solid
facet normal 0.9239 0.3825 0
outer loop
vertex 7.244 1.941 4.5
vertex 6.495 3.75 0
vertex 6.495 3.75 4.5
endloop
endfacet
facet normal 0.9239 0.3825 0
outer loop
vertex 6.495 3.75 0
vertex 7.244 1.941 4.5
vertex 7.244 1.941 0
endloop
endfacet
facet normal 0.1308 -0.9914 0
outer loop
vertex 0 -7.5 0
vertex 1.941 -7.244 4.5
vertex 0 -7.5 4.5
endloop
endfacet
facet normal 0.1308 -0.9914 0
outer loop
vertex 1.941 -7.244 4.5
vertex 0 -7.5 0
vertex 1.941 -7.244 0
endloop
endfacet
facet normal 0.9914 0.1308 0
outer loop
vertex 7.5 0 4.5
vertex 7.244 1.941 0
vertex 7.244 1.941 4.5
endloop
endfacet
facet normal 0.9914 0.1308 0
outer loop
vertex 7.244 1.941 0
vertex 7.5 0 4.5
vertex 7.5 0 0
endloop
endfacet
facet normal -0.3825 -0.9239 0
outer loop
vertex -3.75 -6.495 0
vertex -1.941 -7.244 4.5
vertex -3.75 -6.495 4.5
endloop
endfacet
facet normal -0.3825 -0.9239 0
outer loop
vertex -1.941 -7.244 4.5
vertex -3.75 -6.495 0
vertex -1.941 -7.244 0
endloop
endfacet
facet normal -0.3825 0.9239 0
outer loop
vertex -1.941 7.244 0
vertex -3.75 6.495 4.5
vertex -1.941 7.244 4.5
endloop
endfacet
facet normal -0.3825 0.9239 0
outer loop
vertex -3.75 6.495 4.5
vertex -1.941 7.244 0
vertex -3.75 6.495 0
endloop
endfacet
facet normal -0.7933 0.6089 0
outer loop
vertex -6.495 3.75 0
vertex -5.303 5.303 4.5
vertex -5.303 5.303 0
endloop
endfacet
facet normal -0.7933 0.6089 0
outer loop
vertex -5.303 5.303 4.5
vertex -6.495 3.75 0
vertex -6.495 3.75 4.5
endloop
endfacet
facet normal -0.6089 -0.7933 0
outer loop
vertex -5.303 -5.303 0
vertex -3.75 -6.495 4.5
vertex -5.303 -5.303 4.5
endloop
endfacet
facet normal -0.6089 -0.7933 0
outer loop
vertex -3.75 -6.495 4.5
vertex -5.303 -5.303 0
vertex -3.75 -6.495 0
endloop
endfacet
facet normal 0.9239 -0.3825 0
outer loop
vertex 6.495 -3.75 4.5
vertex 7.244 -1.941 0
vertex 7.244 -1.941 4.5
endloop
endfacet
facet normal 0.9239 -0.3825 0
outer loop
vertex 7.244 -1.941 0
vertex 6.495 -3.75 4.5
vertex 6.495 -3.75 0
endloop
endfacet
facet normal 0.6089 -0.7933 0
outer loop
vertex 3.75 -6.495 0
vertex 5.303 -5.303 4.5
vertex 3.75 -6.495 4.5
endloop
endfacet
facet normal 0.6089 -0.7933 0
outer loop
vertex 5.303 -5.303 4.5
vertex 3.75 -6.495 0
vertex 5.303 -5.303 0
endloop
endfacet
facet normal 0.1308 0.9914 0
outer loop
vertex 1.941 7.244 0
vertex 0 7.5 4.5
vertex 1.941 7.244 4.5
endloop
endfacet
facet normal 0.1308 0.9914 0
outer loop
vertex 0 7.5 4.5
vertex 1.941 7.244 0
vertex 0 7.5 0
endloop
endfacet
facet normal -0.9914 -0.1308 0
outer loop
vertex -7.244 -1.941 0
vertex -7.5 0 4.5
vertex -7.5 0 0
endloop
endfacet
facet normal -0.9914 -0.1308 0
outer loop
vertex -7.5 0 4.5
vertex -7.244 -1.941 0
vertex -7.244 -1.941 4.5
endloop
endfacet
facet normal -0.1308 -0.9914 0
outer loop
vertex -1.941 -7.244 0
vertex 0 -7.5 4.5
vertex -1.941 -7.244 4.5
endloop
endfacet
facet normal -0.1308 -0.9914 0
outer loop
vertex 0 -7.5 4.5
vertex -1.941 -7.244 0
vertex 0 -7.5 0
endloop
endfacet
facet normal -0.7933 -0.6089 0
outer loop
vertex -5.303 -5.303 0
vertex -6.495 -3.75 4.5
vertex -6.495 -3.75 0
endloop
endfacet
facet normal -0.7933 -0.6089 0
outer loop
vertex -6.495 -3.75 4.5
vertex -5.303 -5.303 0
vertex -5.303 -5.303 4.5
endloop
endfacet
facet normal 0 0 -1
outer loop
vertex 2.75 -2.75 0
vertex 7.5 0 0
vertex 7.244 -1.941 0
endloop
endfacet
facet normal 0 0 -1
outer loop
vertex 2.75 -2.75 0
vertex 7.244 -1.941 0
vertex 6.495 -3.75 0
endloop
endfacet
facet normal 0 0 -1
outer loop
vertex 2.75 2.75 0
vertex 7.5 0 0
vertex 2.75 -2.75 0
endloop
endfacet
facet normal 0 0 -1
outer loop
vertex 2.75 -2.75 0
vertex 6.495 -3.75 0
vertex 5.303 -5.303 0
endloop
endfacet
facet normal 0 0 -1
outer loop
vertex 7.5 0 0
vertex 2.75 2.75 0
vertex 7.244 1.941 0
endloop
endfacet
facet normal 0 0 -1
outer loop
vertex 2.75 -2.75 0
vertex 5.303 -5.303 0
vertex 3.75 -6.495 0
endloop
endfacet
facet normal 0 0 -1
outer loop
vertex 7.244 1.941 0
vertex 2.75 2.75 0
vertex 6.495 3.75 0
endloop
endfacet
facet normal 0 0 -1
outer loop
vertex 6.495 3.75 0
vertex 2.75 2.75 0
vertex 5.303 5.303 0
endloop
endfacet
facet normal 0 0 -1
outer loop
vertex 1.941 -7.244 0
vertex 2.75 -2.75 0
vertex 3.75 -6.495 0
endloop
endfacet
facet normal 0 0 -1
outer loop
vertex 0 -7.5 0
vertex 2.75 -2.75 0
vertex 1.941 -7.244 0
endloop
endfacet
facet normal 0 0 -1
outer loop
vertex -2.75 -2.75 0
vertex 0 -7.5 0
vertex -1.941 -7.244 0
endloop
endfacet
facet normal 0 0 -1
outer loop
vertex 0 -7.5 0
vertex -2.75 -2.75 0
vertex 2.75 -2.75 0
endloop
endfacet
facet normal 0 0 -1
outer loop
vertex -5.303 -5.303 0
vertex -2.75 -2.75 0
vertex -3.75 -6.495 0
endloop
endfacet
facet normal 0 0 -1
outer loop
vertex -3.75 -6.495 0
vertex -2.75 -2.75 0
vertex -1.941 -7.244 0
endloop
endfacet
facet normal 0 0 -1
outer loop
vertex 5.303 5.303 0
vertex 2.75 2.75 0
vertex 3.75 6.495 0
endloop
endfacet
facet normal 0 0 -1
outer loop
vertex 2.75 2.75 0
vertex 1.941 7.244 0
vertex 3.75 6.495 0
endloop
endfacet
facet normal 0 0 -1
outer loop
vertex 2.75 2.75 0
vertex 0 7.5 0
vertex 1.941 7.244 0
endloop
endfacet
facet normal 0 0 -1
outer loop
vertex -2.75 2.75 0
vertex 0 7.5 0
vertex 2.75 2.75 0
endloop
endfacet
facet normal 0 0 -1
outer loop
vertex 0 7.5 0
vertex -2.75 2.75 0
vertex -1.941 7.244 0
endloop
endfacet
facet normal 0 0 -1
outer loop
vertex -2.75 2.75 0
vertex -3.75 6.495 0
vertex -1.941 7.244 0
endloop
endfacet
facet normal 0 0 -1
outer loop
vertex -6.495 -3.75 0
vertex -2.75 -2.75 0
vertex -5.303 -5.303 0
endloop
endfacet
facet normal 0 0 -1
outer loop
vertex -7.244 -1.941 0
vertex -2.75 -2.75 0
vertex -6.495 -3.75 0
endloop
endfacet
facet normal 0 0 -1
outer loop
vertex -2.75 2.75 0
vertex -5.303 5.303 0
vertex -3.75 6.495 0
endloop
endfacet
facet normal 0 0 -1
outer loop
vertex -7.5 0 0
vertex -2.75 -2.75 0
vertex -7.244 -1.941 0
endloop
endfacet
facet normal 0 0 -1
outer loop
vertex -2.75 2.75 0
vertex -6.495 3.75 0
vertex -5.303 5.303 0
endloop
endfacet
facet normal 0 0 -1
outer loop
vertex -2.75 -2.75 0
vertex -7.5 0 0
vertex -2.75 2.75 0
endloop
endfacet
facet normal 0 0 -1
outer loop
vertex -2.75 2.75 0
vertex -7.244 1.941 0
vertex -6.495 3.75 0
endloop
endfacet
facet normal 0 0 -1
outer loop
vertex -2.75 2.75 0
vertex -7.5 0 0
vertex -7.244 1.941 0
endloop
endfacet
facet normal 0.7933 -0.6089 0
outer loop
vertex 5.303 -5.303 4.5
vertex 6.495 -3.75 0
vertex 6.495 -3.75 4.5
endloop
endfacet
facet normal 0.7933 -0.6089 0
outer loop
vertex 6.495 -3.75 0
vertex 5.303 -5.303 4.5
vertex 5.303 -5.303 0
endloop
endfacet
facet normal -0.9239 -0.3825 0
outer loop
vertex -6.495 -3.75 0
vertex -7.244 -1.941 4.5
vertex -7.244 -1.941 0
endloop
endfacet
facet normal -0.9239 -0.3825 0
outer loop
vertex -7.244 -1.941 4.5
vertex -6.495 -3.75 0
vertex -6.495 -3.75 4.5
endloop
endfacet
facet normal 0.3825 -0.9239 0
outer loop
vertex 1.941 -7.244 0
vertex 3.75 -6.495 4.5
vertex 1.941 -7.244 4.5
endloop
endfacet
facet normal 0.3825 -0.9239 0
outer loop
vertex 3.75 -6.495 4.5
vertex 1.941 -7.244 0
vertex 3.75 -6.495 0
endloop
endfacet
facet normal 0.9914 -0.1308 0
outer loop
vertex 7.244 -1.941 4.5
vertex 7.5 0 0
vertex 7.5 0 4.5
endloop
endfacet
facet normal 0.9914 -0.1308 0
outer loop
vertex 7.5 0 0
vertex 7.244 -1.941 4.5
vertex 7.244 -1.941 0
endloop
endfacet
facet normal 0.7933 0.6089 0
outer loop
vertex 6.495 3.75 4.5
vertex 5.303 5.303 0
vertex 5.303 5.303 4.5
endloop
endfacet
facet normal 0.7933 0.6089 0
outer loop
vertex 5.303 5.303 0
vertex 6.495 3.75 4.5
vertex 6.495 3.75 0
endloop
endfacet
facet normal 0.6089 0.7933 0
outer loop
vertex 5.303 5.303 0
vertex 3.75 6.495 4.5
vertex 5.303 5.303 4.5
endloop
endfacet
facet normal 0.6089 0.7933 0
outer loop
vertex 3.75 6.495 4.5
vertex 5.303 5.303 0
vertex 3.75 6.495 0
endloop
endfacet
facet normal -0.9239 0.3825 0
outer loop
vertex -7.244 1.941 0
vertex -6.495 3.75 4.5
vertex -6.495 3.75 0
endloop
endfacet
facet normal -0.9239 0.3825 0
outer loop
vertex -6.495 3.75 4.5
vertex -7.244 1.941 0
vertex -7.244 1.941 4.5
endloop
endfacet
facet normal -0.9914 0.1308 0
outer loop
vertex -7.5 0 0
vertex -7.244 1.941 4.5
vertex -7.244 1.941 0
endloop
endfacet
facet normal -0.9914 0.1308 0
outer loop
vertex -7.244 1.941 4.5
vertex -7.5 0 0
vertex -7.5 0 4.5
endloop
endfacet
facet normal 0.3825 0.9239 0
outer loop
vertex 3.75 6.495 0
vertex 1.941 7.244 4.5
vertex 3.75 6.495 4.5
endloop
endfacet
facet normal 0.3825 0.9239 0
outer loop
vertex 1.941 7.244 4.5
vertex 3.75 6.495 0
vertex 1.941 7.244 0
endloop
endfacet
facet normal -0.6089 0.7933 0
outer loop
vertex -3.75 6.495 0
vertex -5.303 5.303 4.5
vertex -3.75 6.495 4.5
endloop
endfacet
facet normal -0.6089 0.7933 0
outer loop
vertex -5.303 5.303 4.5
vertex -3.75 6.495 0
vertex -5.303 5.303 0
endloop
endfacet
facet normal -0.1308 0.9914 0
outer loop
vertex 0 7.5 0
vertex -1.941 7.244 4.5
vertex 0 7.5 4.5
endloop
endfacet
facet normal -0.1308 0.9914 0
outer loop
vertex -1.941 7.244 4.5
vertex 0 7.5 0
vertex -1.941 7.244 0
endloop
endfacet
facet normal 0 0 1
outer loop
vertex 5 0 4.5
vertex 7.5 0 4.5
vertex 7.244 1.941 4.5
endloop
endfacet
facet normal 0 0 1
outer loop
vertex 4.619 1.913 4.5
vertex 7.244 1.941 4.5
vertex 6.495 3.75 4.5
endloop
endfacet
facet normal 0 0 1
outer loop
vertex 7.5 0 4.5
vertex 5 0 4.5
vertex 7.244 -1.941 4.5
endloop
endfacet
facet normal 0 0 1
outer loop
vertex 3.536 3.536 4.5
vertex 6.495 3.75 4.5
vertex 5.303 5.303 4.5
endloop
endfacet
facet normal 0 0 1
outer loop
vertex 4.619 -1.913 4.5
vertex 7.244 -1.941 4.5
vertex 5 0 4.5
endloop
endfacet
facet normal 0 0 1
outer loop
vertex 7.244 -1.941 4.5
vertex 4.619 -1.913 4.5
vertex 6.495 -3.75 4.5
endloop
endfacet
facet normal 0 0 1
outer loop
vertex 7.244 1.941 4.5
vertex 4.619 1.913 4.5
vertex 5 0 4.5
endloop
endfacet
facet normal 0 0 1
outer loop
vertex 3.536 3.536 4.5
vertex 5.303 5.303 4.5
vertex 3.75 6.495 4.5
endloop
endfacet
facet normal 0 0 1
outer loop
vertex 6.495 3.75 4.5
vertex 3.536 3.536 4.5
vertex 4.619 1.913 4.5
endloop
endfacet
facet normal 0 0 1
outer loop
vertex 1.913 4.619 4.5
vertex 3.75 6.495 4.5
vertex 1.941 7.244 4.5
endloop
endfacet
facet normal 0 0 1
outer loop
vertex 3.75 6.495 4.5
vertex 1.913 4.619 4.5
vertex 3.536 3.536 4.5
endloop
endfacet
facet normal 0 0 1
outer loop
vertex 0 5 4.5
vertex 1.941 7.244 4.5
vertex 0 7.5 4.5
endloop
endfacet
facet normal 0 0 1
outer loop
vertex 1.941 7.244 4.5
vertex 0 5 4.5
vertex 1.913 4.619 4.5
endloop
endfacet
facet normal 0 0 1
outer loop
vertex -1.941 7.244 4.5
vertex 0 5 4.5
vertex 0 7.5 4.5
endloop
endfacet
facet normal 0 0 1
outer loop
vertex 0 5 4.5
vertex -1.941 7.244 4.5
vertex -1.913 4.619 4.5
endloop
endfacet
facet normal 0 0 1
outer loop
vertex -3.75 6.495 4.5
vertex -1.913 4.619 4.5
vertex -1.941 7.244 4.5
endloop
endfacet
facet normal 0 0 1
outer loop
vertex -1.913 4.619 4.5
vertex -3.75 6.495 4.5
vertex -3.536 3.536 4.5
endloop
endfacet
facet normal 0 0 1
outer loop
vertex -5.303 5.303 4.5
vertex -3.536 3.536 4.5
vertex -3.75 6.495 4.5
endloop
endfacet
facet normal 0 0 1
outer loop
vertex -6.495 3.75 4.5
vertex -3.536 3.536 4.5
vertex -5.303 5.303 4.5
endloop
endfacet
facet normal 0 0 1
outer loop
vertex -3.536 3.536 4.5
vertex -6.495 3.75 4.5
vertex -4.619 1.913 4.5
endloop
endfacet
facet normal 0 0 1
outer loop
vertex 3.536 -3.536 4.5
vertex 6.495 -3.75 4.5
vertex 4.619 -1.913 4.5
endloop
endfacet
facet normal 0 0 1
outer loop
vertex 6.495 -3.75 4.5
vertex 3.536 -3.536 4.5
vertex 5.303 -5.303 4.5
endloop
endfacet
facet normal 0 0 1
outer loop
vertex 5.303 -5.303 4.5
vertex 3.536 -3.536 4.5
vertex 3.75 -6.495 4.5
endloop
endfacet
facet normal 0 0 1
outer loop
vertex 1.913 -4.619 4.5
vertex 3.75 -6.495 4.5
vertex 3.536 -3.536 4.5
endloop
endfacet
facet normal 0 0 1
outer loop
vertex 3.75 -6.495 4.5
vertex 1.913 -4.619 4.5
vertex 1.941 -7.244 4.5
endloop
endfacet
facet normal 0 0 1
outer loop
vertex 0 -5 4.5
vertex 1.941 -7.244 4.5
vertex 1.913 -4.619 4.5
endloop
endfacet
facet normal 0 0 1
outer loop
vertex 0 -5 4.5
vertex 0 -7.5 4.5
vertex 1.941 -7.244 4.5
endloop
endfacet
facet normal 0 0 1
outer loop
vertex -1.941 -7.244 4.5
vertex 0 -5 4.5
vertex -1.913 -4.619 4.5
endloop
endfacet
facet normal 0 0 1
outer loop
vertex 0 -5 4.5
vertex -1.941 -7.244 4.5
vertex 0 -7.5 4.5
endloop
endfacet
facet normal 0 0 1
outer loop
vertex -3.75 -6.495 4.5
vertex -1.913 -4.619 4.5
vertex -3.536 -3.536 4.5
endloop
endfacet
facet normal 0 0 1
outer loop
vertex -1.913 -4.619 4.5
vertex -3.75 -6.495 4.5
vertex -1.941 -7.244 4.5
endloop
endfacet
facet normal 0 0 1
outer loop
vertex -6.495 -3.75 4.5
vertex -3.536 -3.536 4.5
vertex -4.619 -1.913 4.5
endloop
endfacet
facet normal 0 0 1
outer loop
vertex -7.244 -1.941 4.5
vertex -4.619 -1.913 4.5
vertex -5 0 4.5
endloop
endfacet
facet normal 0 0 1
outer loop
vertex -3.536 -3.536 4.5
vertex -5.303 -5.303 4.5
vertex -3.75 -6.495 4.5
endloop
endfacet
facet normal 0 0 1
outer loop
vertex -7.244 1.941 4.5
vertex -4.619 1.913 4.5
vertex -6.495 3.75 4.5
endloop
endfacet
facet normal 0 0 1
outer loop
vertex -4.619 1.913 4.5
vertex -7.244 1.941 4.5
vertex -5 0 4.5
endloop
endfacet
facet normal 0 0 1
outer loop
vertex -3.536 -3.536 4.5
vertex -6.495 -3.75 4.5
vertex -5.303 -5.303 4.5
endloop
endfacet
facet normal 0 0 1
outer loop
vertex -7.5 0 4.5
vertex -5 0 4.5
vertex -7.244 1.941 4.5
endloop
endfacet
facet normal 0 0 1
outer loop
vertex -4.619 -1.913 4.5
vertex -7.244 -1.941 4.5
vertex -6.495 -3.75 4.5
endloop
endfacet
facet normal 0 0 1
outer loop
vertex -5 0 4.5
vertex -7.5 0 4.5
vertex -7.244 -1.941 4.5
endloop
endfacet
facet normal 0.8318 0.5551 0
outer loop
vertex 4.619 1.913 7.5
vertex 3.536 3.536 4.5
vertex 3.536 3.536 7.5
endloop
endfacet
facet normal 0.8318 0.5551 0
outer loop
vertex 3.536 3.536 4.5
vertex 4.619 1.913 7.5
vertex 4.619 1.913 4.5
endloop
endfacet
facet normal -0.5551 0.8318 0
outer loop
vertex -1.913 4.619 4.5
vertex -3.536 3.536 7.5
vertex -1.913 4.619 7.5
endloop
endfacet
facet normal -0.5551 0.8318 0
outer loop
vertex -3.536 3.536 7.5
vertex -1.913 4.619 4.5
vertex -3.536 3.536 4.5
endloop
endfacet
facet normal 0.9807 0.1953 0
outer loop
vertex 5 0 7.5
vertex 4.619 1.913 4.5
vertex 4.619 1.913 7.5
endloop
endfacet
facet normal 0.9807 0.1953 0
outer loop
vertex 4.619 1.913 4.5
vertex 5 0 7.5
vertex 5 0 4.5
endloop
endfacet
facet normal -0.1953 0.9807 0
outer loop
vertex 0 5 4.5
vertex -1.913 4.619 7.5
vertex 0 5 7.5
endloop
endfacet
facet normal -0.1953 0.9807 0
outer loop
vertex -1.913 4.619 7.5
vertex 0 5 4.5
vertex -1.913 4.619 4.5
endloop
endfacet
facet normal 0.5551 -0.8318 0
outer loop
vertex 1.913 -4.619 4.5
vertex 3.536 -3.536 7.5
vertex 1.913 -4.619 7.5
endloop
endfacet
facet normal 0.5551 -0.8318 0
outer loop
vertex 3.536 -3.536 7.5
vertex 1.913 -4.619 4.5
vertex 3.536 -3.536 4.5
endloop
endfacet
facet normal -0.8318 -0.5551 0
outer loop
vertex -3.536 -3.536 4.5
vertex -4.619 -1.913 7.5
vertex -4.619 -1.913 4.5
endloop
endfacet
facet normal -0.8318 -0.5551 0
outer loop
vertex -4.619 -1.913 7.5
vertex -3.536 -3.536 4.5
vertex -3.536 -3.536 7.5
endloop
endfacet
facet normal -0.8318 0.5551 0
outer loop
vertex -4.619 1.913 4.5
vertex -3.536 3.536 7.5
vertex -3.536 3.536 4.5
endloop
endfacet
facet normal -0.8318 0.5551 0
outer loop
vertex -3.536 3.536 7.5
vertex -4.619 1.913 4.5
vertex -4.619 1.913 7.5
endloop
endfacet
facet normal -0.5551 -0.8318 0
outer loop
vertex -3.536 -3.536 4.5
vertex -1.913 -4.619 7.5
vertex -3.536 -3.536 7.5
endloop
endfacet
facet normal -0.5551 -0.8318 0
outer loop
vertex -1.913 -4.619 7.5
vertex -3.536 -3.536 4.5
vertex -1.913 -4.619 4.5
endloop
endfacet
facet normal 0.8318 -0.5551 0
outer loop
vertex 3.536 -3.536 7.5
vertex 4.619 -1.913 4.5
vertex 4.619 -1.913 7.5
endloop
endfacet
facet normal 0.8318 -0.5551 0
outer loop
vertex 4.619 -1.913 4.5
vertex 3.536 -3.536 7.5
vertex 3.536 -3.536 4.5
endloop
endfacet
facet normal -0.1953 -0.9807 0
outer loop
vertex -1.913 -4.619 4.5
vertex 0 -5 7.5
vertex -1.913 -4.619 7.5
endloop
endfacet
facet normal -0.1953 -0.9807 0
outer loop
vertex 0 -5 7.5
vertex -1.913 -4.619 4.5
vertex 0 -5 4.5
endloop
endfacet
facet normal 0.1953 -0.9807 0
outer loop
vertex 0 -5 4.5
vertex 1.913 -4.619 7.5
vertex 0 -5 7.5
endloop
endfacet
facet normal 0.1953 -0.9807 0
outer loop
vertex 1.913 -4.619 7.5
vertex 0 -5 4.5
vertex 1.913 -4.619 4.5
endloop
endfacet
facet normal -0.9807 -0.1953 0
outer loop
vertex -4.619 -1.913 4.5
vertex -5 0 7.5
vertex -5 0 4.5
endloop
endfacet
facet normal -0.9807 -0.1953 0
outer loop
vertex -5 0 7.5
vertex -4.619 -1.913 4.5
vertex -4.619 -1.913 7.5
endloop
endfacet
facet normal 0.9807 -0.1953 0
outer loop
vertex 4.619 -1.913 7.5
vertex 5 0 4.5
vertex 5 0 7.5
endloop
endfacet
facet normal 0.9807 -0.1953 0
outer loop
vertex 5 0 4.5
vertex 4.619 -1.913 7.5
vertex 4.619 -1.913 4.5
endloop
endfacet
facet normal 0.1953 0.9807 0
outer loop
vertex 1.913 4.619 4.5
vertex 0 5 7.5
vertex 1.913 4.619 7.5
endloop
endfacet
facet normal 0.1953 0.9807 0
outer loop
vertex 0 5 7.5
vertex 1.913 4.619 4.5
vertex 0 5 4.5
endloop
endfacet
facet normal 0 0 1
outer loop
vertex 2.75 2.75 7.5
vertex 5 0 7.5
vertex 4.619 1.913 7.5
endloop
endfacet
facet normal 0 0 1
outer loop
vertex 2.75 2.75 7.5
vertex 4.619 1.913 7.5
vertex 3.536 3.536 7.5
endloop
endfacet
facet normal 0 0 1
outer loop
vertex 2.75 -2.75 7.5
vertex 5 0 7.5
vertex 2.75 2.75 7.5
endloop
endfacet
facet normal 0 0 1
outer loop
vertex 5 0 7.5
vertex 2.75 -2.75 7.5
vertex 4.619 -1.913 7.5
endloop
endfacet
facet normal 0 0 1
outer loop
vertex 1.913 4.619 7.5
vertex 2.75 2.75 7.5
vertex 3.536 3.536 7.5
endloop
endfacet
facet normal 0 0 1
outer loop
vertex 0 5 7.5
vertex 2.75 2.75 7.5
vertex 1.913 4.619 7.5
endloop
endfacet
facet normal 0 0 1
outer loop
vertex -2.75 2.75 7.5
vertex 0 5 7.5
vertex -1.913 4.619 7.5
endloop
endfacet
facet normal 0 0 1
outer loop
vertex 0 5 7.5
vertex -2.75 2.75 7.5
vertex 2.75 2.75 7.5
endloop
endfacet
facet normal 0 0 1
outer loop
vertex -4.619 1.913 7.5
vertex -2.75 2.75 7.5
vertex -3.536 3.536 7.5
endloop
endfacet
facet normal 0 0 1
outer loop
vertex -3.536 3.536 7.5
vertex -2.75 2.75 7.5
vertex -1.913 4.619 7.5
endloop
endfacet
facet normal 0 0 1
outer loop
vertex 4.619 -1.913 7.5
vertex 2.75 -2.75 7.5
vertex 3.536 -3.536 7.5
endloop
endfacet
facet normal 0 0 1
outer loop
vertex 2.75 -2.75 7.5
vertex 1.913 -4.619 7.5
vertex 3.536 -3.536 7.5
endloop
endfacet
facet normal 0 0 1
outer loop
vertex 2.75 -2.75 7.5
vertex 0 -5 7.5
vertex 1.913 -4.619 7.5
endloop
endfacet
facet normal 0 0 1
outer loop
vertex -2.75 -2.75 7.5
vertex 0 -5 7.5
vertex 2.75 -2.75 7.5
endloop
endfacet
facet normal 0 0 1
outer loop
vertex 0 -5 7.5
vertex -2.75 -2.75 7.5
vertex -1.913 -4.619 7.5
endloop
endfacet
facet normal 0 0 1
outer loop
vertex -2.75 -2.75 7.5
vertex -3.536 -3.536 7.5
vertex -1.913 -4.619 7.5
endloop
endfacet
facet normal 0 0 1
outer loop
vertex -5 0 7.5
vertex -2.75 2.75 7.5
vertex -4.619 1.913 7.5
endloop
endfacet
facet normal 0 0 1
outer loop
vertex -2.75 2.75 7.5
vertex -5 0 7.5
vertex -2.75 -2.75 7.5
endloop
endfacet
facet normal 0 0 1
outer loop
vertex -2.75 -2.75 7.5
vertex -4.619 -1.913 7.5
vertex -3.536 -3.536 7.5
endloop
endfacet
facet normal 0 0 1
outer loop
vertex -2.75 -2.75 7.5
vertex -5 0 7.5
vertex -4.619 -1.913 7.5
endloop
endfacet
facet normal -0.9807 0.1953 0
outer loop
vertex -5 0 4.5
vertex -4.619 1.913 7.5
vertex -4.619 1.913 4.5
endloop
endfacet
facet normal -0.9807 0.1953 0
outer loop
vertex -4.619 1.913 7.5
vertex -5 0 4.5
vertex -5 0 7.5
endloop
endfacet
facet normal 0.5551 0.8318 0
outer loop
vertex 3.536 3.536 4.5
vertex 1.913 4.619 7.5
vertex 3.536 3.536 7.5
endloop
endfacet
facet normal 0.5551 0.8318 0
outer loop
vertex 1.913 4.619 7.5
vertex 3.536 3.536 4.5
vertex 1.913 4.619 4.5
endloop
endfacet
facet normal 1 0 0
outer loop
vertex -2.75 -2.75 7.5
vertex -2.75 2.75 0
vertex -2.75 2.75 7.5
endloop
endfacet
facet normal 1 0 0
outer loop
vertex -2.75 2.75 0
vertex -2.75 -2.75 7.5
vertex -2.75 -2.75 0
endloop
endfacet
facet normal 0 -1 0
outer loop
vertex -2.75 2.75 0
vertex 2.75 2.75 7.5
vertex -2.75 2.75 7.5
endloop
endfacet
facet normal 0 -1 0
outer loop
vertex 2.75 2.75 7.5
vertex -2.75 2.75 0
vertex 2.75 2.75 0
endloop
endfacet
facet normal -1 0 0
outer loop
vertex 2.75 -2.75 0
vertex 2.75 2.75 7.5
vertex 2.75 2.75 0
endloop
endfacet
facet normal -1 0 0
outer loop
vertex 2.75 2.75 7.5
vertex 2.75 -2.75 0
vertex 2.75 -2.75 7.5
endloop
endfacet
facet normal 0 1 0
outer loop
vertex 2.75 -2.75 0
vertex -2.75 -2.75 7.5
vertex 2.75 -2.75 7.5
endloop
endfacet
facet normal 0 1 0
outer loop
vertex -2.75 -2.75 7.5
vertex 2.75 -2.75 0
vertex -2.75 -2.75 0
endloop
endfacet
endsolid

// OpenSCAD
// file: varicap.scad
capacitance = 400; // pF
num_plates = 11;
plate_gap = 5;
plate_thickness = 2;

strut_r = 5;
handle_length = 25;
leg_length = 10;
leg_separation_angle=90;

fit_gap = 0.5;
slip_gap = 1;

num_stators = floor(num_plates/2);
num_rotors = ceil(num_plates/2);
leg_angle_0 = leg_separation_angle/2;
leg_angle_1 = 360 - leg_separation_angle/2;
r = sqrt((2*plate_gap*capacitance) / ((num_plates-1)*0.2248*3.14));
//TODO: account for space missing in the centre of the plates

module semicircle () {
    difference() {
        circle(r);
        circle(strut_r-fit_gap);
        translate([r,0,0]) {
            square(2*r, true);
        }
    }
}

module washer() {
    difference() {
        circle(strut_r);
        circle(bolt_r);
    }
}

module spacer(end) {
    
    washer_len = plate_thickness + plate_gap - slip_gap/2;
    bearing_len = end ? plate_thickness*2 + plate_gap + slip_gap/2 : plate_thickness+plate_gap;
    
    difference () {
        union () {
            if (end) {
                linear_extrude (washer_len) {
                    circle (strut_r * 1.5);
                }
            }
            linear_extrude (bearing_len) {
                circle (strut_r);
            }
            translate ([0,0,bearing_len - fit_gap]) {
                linear_extrude(plate_thickness+fit_gap) {
                    square (strut_r, true);
                }
            }
        }
        
        translate ([0,0,-fit_gap]) {
            linear_extrude (plate_thickness + fit_gap*2) {
                square (strut_r+fit_gap, true);
            }
        }
    }
}
// main file
include <varicap.scad>;

module bush () {
    difference () {
        union () {
            linear_extrude (plate_gap - slip_gap/2) {
                circle (strut_r * 1.5);
            }
            linear_extrude (plate_gap + plate_thickness + slip_gap/2) {
                circle (strut_r);
            }
        }
        
        translate ([0,0,-slip_gap/2]) {
            linear_extrude (plate_thickness + plate_gap + slip_gap*2) {
                square (strut_r+slip_gap/2, true);
            }
        }
        
    }
}

bush ();
